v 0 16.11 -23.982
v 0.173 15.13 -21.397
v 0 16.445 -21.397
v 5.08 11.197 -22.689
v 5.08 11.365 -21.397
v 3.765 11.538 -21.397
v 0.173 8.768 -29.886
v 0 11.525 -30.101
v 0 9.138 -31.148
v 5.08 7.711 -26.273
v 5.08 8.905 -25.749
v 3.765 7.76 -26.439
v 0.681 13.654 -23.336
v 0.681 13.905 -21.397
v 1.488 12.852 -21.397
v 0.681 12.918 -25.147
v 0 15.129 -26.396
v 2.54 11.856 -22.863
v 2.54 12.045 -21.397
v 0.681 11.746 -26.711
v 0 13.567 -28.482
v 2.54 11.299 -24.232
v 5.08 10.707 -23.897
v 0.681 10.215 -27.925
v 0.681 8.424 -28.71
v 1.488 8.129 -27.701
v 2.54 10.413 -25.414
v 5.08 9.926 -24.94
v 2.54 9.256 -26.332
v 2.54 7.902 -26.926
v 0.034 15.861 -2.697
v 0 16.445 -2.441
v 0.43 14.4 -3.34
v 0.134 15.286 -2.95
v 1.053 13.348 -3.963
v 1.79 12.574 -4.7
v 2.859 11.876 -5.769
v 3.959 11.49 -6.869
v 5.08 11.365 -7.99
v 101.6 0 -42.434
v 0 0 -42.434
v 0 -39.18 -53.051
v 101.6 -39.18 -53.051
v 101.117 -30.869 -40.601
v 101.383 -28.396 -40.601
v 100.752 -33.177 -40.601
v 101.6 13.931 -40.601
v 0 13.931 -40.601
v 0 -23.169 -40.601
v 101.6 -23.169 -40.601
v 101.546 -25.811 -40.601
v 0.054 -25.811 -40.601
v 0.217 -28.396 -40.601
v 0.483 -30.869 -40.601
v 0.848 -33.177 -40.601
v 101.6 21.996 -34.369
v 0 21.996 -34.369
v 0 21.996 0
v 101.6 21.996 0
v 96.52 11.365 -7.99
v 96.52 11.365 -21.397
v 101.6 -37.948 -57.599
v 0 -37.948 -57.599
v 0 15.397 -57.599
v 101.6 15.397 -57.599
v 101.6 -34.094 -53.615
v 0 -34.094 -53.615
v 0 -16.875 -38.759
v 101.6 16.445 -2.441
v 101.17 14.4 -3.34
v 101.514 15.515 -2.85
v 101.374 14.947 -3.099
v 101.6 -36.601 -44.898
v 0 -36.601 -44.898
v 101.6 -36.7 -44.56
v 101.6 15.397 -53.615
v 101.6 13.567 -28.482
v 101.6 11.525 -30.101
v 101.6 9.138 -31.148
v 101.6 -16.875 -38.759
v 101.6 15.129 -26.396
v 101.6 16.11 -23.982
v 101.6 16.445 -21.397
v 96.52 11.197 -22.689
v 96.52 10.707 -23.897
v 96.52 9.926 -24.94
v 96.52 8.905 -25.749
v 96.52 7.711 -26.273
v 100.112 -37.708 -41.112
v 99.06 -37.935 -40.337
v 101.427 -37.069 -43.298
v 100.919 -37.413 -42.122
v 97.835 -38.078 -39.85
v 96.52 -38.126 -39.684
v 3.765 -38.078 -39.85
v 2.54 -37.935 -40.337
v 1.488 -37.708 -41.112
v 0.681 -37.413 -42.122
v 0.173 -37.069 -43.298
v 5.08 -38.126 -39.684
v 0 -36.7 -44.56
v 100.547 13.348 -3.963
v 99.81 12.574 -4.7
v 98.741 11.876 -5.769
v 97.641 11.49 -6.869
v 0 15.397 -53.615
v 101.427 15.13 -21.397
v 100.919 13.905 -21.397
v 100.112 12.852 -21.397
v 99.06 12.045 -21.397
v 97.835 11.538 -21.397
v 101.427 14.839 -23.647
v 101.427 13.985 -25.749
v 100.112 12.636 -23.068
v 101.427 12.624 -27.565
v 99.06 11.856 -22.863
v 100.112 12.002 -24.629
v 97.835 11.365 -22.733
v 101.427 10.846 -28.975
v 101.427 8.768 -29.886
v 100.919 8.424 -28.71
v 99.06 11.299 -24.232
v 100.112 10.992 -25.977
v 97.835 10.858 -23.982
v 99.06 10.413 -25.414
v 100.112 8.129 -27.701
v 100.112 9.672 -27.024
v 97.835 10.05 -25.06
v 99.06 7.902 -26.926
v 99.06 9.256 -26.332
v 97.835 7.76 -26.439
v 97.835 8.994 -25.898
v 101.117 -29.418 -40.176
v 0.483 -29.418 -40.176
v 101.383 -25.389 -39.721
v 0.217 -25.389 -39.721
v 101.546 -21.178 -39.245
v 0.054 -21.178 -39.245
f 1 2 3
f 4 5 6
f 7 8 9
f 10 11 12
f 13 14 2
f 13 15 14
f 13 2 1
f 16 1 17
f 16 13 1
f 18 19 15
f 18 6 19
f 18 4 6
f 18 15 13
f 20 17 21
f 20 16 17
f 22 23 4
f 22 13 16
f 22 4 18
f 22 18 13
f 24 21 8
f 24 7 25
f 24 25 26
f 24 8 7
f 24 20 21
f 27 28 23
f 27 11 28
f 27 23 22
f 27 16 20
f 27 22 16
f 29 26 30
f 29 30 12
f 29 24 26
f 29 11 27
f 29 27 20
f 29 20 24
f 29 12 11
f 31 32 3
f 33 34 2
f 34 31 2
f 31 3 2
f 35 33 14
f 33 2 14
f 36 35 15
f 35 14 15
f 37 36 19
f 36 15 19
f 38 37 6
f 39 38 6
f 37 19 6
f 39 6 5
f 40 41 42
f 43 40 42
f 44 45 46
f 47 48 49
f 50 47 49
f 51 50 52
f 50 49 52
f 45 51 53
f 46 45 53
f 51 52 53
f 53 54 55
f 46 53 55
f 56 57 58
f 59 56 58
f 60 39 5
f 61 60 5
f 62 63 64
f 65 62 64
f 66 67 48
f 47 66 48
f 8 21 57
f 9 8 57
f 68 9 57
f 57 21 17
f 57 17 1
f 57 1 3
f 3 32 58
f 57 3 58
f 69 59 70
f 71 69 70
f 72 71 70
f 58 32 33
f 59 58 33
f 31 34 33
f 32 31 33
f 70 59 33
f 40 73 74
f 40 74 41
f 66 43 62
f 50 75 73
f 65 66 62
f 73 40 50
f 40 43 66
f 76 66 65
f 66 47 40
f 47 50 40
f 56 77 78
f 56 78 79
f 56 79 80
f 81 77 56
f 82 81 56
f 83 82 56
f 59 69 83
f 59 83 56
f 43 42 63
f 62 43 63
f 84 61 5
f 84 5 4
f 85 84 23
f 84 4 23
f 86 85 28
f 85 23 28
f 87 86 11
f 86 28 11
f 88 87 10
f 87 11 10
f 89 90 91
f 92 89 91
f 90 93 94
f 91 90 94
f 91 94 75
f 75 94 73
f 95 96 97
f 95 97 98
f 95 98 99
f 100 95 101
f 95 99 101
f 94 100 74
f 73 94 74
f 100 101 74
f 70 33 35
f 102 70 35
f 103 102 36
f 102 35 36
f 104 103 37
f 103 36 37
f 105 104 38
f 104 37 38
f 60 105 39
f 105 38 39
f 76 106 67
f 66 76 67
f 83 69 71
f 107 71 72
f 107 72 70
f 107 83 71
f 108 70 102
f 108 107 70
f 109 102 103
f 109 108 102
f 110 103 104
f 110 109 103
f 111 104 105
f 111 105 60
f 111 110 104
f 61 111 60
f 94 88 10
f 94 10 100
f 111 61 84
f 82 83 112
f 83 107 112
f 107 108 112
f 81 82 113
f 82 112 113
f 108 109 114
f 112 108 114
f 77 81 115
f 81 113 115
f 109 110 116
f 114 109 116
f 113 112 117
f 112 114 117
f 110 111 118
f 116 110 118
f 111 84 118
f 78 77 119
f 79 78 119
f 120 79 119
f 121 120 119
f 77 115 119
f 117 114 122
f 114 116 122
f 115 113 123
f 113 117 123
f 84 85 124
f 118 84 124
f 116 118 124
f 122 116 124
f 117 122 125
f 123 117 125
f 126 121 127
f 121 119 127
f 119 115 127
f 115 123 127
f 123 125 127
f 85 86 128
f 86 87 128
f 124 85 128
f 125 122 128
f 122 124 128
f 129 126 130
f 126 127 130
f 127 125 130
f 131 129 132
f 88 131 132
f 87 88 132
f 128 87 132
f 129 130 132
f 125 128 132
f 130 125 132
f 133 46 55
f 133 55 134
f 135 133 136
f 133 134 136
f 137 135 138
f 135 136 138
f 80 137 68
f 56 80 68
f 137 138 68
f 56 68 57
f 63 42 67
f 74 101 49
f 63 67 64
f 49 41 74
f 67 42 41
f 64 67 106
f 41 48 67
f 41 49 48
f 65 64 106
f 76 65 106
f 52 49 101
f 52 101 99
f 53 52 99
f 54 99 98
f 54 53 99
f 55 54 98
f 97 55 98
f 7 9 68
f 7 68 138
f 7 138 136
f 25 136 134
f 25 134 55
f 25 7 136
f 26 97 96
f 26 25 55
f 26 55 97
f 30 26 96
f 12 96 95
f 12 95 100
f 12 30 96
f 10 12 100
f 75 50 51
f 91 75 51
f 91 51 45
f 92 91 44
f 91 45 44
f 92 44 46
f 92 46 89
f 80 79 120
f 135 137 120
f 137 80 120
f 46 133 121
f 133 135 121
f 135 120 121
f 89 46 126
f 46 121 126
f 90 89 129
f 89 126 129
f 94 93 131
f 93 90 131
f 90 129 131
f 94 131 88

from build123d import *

# Parameters (mm, degrees)
F1_DEPTH     = 101.6
F2_T1_DEPTH  = 101.6
F2_T3_DEPTH  = 118.1792407144
F2_T5_DEPTH  = 29.422869264
F2_T7_DEPTH  = 60.4590704492
F2_T10_ANGLE = 73.6909129446
F2_T12_ANGLE = 73.6909129446


# Not quite as in the source:
# - a fillet or chamfer that OpenCascade refuses, or shapes differently, is made with other operations: its cross-section is extruded or revolved along the edge and cut away or added


with BuildPart() as f1:
    # F0 (on Right) → F1 (new body)
    with BuildSketch(Plane.YZ):
        Polygon((15.3971137479, -57.599131723), (15.3971137479, -53.6149479449), (-34.0936109424, -53.6149479449), (13.9307221398, -40.600720793), (-33.1771150231, -40.600720793), (21.9958759844, -34.3685559928), (21.9958759844, 0), (11.3645363599, -4.6741236001), (11.3645363599, -25.2036079764), (-38.1261855364, -39.6842285991), (-36.6007449852, -44.8977588791), (0, -42.4337126315), (-39.1800553827, -53.0512081353), (-37.9476028562, -57.599131723), align=None)
    extrude(amount=F1_DEPTH)

    # F2: fillet of radius 5.08 on 6 edges, made by hand

    # F2_s2 → F2_t1 (join)
    with BuildSketch(Plane.YZ):
        with BuildLine():
            ThreePointArc((11.3645363599, -21.3969928641), (10.3498362027, -24.44325897), (7.7110965222, -26.2725775576))
            Line((7.7110965222, -26.2725775576), (11.3645363599, -25.2036079764))
            Line((11.3645363599, -25.2036079764), (11.3645363599, -21.3969928641))
        make_face()
    extrude(amount=F2_T1_DEPTH)

    # F2_s4 → F2_t3 (cut)
    with BuildSketch(Plane.YZ.offset(-8.2896203572)):
        with BuildLine():
            ThreePointArc((14.3999677165, -3.3395804625), (12.1905494824, -5.2132838517), (11.3645363599, -7.989971743))
            Line((11.3645363599, -7.989971743), (11.3645363599, -4.6741236001))
            Line((11.3645363599, -4.6741236001), (14.3999677165, -3.3395804625))
        make_face()
    extrude(amount=F2_T3_DEPTH, mode=Mode.SUBTRACT)

    # F2_s6 → F2_t5 (cut)
    with BuildSketch(Plane.XY.offset(-21.3969928641)):
        with BuildLine():
            ThreePointArc((0, 16.4445363599), (1.4878975516, 12.8524339115), (5.08, 11.3645363599))
            Line((5.08, 11.3645363599), (0, 11.3645363599))
            Line((0, 11.3645363599), (0, 16.4445363599))
        make_face()
        with BuildLine():
            ThreePointArc((101.6, 16.4445363599), (100.1121024484, 12.8524339115), (96.52, 11.3645363599))
            Line((96.52, 11.3645363599), (101.6, 11.3645363599))
            Line((101.6, 11.3645363599), (101.6, 16.4445363599))
        make_face()
    extrude(amount=F2_T5_DEPTH, mode=Mode.SUBTRACT)

    # F2_s8 → F2_t7 (cut)
    with BuildSketch(Plane(origin=(0, 0.0220464736, 0.0064506358), x_dir=(1, 0, 0), z_dir=(0, -0.9597607664, -0.2808189296))):
        with BuildLine():
            ThreePointArc((0, -32.4608110442), (1.4878975516, -28.8687085958), (5.08, -27.3808110442))
            Line((5.08, -27.3808110442), (0, -27.3808110442))
            Line((0, -27.3808110442), (0, -32.4608110442))
        make_face()
        with BuildLine():
            ThreePointArc((101.6, -32.4608110442), (100.1121024484, -28.8687085958), (96.52, -27.3808110442))
            Line((96.52, -27.3808110442), (101.6, -27.3808110442))
            Line((101.6, -27.3808110442), (101.6, -32.4608110442))
        make_face()
    extrude(amount=F2_T7_DEPTH, mode=Mode.SUBTRACT)

    # F2_s9 → F2_t10 (revolve, cut)
    with BuildSketch(Plane.XY.offset(-21.3969928641)):
        with BuildLine():
            ThreePointArc((101.6, 16.4445363599), (100.1121024484, 12.8524339115), (96.52, 11.3645363599))
            Line((96.52, 11.3645363599), (101.6, 11.3645363599))
            Line((101.6, 11.3645363599), (101.6, 16.4445363599))
        make_face()
    revolve(axis=Axis((101.6, 6.2845363599, -21.3969928641), (-1, 0, 0)), revolution_arc=F2_T10_ANGLE, mode=Mode.SUBTRACT)

    # F2_s11 → F2_t12 (revolve, cut)
    with BuildSketch(Plane.XY.offset(-21.3969928641)):
        with BuildLine():
            ThreePointArc((0, 16.4445363599), (1.4878975516, 12.8524339115), (5.08, 11.3645363599))
            Line((5.08, 11.3645363599), (0, 11.3645363599))
            Line((0, 11.3645363599), (0, 16.4445363599))
        make_face()
    revolve(axis=Axis((0, 6.2845363599, -21.3969928641), (-1, 0, 0)), revolution_arc=F2_T12_ANGLE, mode=Mode.SUBTRACT)


solid = f1.part
